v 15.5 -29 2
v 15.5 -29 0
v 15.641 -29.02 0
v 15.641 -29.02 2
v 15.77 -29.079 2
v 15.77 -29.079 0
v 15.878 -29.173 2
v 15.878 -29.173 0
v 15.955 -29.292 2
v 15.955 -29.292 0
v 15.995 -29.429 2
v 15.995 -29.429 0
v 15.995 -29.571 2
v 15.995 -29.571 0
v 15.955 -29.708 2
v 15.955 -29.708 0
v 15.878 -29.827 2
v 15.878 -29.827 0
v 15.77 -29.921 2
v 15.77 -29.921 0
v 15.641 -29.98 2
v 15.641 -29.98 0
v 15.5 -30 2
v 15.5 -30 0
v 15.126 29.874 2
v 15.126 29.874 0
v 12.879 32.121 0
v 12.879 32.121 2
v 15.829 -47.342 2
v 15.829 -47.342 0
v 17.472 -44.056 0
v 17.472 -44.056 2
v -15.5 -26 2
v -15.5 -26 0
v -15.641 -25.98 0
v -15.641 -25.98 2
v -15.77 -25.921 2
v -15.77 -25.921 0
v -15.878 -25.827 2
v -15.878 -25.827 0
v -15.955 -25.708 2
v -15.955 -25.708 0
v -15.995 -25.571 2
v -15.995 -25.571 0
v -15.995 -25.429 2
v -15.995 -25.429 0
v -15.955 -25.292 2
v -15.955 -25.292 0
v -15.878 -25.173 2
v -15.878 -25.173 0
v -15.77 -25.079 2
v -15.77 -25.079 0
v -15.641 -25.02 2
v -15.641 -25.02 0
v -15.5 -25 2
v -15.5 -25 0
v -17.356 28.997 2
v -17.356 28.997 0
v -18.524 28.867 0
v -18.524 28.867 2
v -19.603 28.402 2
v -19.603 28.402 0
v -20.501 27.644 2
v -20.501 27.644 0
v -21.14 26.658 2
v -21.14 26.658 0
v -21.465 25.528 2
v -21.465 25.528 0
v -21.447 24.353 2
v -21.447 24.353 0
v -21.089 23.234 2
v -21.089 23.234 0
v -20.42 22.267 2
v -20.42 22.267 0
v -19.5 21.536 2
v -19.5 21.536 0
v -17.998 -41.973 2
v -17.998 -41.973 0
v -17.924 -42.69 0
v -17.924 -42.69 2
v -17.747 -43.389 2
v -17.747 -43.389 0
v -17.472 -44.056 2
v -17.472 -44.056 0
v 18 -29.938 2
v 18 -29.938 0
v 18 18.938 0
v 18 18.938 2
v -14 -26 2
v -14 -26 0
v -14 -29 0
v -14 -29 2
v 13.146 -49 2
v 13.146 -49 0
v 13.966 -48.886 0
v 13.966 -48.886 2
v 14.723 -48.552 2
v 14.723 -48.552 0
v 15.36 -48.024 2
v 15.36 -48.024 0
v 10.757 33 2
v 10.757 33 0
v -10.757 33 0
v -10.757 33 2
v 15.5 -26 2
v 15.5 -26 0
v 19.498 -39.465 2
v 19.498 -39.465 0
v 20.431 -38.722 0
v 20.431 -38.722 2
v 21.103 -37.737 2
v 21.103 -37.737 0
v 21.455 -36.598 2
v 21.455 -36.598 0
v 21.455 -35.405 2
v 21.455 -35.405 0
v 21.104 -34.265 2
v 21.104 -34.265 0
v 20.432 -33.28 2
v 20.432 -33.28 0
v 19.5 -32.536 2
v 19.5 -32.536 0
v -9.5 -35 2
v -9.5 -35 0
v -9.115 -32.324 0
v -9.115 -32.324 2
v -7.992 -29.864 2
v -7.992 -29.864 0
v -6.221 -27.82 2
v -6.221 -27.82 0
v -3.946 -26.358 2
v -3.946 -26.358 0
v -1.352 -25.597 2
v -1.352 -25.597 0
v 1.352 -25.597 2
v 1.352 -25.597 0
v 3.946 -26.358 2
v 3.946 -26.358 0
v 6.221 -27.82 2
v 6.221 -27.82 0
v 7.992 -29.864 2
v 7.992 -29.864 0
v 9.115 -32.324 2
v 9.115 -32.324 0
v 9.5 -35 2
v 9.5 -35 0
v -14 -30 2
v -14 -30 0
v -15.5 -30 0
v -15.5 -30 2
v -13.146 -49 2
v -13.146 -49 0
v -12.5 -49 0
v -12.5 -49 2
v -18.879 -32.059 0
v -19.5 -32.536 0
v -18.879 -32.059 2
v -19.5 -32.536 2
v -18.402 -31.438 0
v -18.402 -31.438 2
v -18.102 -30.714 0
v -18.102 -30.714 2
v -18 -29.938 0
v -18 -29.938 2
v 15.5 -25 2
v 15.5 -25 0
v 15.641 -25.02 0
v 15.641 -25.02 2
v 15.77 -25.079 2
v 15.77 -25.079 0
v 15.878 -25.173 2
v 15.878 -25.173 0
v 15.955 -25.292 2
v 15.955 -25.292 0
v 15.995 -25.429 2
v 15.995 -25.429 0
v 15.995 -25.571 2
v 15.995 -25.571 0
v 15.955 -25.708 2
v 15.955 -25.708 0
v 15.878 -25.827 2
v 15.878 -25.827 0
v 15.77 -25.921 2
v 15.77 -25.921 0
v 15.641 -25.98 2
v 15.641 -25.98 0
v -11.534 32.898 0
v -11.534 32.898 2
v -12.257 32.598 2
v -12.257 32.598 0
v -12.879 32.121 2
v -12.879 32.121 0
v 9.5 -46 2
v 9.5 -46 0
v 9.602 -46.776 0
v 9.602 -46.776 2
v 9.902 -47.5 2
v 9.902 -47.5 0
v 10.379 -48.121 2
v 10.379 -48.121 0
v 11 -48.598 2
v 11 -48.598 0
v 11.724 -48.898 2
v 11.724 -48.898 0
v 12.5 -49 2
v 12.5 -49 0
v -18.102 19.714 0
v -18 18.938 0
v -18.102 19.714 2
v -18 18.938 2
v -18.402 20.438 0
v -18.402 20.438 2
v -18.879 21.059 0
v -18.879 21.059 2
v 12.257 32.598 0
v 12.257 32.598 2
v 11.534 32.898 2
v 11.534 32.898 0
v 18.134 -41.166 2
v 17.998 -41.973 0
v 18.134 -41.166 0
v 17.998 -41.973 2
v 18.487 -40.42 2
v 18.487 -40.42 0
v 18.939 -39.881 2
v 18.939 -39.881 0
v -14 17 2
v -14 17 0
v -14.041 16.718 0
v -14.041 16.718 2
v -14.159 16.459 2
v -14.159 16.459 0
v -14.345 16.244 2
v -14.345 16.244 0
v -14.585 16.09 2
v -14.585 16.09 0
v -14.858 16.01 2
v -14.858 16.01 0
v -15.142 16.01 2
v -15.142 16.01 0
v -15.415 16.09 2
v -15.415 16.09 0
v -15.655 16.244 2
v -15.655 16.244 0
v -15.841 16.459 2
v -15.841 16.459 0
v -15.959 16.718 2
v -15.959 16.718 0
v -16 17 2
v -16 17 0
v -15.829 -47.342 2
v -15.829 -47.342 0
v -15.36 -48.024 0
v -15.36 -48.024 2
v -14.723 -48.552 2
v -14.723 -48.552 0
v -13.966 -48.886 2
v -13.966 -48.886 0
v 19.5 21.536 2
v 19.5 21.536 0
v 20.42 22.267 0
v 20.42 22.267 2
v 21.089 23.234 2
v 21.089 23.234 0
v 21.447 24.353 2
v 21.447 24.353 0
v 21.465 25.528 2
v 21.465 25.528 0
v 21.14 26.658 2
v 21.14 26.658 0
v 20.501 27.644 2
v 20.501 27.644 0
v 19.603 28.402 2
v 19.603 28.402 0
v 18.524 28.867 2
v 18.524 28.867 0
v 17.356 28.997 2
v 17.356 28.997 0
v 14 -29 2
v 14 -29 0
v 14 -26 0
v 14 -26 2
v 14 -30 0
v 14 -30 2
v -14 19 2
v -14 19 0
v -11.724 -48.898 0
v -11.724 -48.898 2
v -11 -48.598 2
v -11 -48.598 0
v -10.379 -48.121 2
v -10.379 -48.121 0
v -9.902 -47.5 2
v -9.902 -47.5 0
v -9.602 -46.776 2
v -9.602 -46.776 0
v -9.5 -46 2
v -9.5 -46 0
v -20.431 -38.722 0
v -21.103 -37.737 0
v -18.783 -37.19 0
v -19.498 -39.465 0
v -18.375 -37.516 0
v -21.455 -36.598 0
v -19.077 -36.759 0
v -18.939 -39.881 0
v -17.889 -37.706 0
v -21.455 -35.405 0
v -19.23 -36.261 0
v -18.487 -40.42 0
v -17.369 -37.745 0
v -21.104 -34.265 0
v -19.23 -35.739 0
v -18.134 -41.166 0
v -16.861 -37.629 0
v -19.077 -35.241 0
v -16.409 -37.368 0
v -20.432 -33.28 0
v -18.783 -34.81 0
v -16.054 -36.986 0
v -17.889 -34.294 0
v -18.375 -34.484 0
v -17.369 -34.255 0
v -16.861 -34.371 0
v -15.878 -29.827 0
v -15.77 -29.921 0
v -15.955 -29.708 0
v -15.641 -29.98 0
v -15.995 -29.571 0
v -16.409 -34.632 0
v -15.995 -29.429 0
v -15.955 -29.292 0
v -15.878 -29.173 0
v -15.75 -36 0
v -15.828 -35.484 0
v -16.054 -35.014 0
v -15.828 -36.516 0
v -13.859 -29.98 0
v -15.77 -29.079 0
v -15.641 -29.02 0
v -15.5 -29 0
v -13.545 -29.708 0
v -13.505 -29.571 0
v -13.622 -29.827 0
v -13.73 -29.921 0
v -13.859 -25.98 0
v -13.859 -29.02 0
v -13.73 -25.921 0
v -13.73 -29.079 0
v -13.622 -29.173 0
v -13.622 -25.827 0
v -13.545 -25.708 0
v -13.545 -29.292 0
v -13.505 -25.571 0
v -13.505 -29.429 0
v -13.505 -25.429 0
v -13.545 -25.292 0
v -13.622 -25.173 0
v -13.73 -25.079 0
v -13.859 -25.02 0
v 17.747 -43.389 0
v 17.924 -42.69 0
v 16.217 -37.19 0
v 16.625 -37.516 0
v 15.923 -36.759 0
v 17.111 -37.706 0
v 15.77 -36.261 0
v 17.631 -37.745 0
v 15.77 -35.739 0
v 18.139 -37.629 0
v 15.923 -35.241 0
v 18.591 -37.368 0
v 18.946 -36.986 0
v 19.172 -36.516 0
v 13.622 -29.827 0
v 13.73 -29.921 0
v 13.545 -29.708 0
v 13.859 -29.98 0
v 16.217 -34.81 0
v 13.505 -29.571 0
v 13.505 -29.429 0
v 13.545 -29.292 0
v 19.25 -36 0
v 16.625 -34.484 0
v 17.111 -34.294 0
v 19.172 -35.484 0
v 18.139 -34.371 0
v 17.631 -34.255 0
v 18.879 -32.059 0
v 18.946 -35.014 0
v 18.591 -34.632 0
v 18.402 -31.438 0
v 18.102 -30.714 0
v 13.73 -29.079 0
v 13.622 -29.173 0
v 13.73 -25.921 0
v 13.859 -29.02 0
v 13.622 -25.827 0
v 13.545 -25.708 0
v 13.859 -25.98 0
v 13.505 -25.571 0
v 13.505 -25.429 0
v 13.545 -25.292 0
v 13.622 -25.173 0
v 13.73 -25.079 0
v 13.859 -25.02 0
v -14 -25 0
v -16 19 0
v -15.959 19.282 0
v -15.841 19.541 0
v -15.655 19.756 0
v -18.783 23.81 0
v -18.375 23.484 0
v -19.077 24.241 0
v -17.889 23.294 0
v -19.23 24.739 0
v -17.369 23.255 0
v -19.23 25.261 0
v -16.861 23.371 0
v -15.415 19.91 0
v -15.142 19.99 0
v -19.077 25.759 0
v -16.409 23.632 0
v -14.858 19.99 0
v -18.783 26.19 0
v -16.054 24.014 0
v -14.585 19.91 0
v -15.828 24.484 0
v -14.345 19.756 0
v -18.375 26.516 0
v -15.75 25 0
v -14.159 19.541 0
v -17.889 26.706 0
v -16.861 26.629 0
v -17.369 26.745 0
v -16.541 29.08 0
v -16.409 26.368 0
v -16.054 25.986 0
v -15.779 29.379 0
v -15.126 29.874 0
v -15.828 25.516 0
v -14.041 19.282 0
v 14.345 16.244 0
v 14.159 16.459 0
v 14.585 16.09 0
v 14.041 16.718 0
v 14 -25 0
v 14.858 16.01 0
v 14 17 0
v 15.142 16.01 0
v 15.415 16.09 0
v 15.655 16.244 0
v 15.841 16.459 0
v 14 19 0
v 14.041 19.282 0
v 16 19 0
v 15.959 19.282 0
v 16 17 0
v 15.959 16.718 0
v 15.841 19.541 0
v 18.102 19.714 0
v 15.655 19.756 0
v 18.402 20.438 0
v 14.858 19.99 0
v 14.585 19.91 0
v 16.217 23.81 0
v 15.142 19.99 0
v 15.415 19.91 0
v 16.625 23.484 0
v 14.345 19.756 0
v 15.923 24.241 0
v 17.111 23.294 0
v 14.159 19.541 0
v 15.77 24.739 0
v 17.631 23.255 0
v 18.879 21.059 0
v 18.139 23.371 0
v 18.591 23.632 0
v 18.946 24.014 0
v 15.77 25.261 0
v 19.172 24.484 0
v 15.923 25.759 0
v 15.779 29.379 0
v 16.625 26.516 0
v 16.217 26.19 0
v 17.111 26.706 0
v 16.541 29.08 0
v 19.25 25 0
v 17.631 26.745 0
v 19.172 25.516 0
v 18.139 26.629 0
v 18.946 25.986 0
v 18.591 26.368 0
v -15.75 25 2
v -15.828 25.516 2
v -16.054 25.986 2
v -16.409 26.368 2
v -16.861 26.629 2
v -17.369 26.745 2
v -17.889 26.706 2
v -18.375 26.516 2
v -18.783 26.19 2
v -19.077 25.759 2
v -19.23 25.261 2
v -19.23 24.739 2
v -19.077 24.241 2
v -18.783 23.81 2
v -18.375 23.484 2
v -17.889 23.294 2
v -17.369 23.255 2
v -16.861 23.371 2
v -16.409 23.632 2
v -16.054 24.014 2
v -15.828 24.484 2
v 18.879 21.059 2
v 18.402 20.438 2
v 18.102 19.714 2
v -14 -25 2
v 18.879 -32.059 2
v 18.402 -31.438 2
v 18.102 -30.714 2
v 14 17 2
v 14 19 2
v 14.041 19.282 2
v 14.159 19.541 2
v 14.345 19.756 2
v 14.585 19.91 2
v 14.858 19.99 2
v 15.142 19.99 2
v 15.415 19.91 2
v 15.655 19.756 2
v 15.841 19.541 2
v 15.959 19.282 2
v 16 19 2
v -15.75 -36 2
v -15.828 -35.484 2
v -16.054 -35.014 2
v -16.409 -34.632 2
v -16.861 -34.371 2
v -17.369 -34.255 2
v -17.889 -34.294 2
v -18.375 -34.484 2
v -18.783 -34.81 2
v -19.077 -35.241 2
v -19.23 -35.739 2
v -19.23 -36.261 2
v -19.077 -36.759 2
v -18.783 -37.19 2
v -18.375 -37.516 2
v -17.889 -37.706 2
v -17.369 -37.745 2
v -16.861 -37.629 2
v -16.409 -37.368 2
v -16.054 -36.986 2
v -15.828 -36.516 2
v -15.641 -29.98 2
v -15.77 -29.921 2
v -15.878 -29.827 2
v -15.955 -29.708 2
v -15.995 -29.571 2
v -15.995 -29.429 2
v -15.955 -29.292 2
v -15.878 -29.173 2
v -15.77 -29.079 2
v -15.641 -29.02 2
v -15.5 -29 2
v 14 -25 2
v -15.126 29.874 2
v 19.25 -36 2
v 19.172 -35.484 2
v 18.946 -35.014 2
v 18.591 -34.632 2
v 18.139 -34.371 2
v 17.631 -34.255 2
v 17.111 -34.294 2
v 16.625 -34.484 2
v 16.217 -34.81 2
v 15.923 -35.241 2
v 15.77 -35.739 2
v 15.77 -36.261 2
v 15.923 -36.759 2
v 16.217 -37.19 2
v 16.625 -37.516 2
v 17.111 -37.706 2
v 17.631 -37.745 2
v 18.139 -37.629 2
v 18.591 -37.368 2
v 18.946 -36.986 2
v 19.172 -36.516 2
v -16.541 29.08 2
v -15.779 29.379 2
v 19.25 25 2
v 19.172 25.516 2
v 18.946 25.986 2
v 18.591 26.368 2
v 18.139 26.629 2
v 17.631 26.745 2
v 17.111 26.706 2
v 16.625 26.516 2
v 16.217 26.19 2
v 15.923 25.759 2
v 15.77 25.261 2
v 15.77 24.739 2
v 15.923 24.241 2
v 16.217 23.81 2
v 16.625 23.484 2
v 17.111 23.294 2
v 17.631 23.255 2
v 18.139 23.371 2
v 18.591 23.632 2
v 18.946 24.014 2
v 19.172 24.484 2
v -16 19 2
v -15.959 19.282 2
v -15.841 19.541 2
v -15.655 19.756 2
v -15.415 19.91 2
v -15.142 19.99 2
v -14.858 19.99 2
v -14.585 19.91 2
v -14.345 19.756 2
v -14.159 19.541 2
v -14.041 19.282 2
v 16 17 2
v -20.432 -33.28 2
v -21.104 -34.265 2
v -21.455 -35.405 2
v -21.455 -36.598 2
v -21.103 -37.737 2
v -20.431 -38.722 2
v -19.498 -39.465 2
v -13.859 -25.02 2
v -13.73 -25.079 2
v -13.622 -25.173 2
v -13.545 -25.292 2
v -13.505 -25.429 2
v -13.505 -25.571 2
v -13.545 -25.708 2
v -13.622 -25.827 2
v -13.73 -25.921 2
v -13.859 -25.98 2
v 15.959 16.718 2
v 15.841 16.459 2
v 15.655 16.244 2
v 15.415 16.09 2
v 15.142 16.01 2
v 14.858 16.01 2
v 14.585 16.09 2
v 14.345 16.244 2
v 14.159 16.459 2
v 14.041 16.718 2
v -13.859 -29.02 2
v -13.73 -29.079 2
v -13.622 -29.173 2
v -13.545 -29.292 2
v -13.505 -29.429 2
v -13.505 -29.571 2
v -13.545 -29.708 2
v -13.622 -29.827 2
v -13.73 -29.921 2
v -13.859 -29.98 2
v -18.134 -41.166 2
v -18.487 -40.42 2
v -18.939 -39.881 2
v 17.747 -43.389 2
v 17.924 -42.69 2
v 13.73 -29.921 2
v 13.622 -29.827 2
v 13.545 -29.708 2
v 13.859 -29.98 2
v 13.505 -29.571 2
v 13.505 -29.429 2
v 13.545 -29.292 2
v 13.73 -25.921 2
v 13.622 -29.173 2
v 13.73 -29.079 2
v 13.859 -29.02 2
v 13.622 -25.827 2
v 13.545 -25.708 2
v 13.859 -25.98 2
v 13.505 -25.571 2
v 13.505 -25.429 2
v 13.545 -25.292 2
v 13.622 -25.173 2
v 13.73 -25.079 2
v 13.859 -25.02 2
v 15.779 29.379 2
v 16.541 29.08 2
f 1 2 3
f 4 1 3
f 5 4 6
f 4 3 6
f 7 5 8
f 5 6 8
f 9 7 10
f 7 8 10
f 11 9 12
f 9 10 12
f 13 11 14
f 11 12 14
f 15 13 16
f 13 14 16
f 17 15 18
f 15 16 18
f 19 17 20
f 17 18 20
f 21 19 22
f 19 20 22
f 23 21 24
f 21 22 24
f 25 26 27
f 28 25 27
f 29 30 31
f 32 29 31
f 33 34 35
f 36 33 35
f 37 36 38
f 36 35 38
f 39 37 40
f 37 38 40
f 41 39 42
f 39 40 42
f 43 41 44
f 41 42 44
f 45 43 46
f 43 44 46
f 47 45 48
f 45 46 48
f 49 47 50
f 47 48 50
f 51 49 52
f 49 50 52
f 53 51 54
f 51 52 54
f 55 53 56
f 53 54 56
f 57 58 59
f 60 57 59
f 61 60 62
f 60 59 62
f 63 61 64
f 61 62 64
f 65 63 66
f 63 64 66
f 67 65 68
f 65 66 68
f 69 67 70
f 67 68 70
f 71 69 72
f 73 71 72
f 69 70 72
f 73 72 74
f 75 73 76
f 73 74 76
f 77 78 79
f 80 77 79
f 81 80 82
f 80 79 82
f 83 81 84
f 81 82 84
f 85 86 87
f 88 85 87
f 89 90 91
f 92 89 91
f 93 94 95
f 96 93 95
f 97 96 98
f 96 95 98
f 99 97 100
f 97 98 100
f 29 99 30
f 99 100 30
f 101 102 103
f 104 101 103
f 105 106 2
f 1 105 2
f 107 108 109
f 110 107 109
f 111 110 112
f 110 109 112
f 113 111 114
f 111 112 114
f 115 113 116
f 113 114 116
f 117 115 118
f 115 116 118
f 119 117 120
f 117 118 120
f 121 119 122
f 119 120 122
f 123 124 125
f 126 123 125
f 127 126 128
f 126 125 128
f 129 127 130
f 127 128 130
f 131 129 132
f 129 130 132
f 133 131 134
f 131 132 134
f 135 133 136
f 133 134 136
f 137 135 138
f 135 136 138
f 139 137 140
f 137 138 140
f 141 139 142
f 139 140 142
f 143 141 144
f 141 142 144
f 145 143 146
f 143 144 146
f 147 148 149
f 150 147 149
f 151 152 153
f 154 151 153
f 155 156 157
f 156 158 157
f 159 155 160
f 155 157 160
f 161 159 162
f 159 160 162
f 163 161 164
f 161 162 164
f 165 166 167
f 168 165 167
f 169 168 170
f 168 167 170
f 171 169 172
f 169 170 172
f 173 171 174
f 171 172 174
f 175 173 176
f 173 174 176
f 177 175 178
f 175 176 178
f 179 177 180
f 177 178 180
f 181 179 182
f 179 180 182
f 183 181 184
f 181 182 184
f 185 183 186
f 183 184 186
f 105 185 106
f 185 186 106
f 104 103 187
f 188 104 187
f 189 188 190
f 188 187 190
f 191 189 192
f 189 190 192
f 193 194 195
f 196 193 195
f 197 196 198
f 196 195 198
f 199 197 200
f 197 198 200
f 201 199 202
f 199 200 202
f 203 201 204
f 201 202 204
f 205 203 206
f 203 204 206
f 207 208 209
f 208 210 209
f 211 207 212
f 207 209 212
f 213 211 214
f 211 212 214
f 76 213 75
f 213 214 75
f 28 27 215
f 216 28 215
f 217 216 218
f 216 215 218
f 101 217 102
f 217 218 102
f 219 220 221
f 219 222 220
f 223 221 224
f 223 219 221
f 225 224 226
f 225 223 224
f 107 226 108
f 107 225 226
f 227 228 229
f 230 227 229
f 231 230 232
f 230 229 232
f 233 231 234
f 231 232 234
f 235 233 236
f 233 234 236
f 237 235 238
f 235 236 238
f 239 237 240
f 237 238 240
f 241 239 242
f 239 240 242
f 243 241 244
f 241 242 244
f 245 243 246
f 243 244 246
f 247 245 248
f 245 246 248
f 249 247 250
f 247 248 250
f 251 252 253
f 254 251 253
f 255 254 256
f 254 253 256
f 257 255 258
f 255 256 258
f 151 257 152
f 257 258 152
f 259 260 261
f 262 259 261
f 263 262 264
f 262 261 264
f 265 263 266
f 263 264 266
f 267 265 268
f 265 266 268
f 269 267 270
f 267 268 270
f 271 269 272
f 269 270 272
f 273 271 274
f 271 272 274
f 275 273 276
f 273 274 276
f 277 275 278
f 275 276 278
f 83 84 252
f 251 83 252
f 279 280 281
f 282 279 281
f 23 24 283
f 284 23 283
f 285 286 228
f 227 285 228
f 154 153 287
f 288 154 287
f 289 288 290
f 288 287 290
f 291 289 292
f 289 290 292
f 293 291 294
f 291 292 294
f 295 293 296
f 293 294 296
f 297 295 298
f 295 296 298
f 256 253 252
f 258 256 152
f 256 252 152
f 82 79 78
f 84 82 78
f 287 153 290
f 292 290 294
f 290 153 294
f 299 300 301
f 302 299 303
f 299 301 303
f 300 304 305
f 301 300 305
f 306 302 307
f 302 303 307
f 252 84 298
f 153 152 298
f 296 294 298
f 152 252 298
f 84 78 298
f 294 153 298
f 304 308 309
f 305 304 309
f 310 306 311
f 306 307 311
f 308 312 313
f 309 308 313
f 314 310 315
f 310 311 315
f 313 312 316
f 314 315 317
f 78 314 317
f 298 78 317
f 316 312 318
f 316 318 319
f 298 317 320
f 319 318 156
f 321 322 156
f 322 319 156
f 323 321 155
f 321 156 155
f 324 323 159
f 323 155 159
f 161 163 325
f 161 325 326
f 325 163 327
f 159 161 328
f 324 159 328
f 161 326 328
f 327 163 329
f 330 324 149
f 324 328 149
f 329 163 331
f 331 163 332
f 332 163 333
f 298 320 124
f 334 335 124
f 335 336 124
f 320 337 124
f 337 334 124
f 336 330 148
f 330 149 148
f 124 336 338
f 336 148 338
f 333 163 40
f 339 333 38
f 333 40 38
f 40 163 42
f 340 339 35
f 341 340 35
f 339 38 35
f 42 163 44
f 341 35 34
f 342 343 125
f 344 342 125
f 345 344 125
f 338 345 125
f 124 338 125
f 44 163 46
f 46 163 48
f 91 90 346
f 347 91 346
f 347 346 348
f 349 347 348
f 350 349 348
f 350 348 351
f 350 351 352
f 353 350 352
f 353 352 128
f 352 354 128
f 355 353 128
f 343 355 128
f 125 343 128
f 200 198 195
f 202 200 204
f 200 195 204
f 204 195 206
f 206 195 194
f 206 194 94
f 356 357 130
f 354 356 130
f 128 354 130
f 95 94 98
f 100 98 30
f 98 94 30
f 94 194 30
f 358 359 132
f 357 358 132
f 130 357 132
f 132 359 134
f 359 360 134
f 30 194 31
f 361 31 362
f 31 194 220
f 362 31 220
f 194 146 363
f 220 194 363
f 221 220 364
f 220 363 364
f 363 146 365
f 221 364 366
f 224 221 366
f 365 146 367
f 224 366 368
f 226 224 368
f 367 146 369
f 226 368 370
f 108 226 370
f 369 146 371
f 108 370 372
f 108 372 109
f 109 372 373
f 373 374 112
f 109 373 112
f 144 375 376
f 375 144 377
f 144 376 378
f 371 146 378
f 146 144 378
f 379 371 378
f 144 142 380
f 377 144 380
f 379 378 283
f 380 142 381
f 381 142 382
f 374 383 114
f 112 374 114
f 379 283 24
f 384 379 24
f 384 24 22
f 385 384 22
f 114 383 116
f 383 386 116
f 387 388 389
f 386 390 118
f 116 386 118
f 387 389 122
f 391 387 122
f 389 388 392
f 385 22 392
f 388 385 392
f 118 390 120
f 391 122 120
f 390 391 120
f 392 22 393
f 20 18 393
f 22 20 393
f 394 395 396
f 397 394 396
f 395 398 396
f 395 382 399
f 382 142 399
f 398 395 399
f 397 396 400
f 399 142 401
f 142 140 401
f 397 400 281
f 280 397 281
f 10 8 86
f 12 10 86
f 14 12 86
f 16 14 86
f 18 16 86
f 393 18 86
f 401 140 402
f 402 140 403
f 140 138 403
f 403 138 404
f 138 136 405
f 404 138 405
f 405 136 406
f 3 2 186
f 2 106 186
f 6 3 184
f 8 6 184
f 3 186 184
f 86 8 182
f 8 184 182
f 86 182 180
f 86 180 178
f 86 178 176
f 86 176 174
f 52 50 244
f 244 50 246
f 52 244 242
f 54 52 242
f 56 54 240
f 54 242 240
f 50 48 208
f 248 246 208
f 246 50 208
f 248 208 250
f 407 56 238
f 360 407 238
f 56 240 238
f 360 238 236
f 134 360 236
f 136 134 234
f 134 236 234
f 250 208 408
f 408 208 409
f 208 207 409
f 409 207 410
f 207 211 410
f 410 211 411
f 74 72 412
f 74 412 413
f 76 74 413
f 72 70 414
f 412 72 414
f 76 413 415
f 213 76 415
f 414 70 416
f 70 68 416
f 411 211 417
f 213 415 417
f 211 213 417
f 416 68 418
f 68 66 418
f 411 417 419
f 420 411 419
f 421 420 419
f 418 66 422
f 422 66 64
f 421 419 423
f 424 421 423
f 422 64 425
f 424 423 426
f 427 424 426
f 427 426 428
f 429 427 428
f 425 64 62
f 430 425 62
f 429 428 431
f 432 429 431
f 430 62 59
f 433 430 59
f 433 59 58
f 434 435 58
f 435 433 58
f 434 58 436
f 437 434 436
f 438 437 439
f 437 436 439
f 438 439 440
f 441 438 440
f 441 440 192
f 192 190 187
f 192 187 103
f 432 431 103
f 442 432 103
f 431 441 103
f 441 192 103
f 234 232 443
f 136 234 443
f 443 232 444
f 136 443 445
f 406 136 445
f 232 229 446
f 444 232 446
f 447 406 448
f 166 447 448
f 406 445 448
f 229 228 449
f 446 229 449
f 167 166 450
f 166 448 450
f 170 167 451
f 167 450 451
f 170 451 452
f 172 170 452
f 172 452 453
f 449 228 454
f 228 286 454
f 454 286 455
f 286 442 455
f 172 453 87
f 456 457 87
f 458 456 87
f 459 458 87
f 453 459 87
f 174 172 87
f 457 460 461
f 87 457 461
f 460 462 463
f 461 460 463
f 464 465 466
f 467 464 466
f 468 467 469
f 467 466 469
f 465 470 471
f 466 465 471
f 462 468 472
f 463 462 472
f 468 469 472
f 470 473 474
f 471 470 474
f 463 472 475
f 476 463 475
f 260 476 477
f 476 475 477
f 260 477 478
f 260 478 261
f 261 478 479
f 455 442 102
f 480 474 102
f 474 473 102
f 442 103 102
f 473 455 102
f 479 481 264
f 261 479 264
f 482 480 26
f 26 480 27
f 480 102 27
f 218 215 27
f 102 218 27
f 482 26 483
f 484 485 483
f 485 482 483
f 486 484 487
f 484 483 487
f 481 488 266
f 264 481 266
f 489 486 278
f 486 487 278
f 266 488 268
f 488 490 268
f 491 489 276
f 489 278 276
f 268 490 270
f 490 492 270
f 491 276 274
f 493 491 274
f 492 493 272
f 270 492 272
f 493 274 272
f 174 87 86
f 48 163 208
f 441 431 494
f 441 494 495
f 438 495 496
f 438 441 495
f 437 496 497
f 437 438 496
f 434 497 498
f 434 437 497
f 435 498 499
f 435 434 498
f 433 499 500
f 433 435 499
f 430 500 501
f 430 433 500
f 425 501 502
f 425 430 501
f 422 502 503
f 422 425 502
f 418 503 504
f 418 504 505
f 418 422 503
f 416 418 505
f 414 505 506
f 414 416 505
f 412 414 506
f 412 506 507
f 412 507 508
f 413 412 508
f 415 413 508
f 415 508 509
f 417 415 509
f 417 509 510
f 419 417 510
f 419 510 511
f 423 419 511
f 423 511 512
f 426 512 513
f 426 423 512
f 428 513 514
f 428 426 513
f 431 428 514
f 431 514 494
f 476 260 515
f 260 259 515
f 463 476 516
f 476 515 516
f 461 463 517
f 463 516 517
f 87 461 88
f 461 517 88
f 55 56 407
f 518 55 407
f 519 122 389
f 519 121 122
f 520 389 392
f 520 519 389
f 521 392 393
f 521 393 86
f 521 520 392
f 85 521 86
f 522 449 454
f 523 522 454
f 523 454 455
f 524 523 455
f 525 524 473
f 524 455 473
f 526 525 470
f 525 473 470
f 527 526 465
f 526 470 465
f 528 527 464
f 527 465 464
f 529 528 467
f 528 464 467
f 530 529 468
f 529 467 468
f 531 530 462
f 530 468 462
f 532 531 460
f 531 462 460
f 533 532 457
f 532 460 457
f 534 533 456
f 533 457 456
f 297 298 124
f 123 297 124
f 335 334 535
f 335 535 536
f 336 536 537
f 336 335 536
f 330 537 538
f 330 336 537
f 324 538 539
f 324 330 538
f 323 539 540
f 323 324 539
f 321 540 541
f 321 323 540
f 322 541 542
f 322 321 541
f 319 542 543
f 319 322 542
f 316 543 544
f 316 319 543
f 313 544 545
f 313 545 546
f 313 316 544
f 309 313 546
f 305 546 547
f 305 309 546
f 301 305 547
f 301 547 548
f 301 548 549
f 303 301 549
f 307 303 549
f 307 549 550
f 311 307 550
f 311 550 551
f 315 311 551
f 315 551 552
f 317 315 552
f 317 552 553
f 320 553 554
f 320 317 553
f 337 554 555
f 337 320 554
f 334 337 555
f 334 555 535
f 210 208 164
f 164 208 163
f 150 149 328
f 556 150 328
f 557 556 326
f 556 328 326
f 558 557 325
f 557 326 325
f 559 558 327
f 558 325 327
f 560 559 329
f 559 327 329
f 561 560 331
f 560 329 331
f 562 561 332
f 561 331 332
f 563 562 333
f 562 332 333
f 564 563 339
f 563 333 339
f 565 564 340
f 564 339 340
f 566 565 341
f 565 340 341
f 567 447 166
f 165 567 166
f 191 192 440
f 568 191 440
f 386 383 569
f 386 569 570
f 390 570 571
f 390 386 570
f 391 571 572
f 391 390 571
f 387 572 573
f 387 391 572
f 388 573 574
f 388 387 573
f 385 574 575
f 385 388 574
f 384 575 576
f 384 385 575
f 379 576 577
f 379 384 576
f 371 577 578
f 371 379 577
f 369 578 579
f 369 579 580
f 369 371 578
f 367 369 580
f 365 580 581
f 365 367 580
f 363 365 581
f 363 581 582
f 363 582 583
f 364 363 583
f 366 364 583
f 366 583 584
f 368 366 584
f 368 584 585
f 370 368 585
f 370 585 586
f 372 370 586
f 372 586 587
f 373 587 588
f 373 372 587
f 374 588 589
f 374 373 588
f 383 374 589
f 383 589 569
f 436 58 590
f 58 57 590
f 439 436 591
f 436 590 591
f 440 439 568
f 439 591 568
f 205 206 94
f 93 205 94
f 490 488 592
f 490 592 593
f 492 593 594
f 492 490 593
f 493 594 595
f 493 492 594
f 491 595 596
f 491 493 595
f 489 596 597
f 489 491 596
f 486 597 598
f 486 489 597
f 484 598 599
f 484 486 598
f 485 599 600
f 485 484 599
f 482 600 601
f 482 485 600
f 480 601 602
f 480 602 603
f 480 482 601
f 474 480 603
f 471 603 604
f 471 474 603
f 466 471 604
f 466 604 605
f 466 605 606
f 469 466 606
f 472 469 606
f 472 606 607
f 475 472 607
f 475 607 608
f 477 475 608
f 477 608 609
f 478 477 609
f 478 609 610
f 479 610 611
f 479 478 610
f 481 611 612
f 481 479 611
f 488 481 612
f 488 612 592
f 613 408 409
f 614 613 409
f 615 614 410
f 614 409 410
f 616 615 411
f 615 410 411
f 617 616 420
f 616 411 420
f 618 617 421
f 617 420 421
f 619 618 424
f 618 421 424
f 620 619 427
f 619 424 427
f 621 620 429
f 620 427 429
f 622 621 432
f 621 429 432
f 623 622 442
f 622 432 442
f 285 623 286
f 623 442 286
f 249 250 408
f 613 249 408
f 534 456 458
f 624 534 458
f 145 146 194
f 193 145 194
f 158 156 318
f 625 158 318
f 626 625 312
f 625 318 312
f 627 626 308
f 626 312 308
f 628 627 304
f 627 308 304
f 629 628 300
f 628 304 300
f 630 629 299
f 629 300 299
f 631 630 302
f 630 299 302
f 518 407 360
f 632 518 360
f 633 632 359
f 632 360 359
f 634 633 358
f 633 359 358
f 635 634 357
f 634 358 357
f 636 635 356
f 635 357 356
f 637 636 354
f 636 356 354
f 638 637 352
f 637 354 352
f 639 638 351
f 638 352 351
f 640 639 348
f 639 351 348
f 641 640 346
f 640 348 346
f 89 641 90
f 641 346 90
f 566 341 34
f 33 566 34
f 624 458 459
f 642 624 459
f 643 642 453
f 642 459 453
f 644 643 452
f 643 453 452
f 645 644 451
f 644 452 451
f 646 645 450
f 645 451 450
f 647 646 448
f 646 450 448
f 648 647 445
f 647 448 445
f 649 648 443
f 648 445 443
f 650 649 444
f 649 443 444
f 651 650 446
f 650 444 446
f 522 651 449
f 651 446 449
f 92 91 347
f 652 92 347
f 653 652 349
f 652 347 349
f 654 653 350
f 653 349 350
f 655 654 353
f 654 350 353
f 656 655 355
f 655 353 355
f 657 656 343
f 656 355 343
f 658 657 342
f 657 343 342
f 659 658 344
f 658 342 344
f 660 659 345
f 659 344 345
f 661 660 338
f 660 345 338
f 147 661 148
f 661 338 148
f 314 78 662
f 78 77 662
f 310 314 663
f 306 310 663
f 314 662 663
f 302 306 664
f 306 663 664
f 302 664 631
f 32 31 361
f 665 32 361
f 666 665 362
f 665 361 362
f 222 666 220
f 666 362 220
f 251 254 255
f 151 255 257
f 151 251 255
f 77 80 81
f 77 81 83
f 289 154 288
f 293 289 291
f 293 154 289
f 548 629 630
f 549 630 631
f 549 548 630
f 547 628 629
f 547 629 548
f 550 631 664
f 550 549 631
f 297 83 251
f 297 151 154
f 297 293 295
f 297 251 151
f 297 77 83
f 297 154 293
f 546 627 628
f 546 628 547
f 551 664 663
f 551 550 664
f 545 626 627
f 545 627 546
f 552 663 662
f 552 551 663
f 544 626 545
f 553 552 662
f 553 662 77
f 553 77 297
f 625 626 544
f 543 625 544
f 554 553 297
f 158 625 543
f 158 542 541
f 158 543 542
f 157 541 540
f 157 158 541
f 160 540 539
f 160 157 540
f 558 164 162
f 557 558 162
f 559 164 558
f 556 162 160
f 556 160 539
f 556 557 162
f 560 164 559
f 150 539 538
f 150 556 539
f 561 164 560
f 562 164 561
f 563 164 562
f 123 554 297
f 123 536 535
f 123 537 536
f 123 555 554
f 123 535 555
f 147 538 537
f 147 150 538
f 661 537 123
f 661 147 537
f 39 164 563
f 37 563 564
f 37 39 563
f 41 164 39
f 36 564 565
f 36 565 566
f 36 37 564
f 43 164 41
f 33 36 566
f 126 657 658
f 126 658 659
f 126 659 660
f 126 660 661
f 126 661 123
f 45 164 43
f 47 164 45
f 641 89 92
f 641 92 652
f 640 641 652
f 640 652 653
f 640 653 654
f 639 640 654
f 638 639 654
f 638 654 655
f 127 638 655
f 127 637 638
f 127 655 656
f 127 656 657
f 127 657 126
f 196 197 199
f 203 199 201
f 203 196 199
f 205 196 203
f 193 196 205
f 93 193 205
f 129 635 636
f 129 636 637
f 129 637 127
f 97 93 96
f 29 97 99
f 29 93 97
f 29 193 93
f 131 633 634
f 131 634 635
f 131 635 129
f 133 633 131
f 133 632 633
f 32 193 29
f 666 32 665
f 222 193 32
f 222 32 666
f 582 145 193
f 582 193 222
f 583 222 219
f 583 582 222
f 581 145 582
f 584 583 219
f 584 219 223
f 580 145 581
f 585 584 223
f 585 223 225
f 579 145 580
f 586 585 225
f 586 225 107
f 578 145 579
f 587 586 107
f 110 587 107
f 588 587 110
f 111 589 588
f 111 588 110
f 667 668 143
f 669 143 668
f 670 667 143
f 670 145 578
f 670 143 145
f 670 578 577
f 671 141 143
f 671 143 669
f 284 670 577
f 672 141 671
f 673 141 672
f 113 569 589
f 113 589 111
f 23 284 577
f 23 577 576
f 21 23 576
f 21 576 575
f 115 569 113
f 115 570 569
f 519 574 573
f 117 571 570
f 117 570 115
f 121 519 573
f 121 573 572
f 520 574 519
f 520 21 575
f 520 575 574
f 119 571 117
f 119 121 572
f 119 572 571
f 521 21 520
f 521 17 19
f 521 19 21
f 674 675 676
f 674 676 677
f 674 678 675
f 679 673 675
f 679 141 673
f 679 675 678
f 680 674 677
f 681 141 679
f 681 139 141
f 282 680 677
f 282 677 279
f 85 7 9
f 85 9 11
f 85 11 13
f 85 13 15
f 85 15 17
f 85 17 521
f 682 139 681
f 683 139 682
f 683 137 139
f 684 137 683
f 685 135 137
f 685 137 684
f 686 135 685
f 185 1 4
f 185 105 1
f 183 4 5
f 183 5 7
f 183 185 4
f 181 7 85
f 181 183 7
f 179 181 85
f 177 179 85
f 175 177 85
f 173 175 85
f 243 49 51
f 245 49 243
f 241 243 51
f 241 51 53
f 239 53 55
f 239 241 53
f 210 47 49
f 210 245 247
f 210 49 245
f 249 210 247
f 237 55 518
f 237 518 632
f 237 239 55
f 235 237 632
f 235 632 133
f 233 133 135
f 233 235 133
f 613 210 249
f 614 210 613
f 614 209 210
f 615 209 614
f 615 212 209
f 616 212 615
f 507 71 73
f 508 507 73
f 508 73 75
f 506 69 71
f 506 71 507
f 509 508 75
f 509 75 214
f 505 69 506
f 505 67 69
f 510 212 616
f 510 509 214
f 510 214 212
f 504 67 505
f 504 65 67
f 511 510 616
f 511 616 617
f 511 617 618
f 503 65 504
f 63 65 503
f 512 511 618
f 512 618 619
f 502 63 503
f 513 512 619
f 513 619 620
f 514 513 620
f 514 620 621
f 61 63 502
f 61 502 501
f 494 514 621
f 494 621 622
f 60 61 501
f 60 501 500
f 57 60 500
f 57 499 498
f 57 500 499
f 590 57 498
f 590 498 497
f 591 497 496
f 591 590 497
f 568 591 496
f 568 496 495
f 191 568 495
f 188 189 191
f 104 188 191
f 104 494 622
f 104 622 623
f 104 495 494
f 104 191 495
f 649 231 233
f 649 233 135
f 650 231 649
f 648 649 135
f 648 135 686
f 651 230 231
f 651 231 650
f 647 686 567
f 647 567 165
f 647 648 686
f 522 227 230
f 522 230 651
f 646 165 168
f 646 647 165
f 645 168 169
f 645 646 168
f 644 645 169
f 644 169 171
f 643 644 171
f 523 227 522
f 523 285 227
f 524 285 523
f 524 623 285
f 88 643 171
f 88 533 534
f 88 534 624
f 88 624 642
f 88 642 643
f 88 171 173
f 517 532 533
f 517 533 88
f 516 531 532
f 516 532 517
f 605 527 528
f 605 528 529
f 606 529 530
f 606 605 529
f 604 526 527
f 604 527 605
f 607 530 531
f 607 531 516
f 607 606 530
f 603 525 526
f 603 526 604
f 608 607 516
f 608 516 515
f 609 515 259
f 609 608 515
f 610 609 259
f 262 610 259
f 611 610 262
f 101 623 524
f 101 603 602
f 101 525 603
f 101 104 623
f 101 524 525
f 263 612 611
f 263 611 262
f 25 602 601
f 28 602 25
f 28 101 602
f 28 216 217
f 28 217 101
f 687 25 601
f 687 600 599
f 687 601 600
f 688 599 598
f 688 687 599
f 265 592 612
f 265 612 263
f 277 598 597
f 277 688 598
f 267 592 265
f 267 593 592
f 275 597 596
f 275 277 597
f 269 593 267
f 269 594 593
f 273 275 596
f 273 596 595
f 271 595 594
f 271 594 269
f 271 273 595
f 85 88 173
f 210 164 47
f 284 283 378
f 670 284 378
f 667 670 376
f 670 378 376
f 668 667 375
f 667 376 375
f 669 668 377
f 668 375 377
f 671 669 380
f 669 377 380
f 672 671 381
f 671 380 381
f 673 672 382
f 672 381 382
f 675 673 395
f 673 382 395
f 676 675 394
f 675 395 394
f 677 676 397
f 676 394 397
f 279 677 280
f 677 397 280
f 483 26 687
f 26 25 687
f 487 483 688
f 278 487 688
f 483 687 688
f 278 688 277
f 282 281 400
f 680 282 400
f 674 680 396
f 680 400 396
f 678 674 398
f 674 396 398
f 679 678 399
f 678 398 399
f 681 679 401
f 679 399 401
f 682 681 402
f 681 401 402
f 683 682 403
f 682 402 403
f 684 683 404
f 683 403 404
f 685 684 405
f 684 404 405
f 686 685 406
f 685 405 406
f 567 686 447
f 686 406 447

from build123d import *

# Parameters (mm, degrees)
F0_R     = 1.75
F1_DEPTH = 2
F2_R     = 3


with BuildPart() as f1:
    # F0 (on Top) → F1 (new body)
    with BuildSketch(Plane.XY):
        with BuildLine():
            ThreePointArc((-15.82918, -47.341641), (-14.723091, -48.551952), (-13.145898, -49))
            Line((-13.145898, -49), (-12.5, -49))
            ThreePointArc((-12.5, -49), (-10.37868, -48.12132), (-9.5, -46))
            Line((-9.5, -46), (-9.5, -35))
            ThreePointArc((-9.5, -35), (0, -25.5), (9.5, -35))
            Line((9.5, -35), (9.5, -46))
            ThreePointArc((9.5, -46), (10.37868, -48.12132), (12.5, -49))
            Line((12.5, -49), (13.145898, -49))
            ThreePointArc((13.145898, -49), (14.723091, -48.551952), (15.82918, -47.341641))
            Line((15.82918, -47.341641), (17.472136, -44.055728))
            ThreePointArc((17.472136, -44.055728), (17.866245, -42.968425), (18, -41.81966))
            Line((18, -41.81966), (18, -39.968627))
            ThreePointArc((18, -39.968627), (21.5, -36), (18, -32.031373))
            Line((18, -32.031373), (18, 21.031373))
            ThreePointArc((18, 21.031373), (21.39785, 25.898203), (16.212777, 28.787223))
            Line((16.212777, 28.787223), (12.87868, 32.12132))
            ThreePointArc((12.87868, 32.12132), (11.90541, 32.771639), (10.757359, 33))
            Line((10.757359, 33), (-10.757359, 33))
            ThreePointArc((-10.757359, 33), (-11.90541, 32.771639), (-12.87868, 32.12132))
            Line((-12.87868, 32.12132), (-16.212777, 28.787223))
            ThreePointArc((-16.212777, 28.787223), (-21.39785, 25.898203), (-18, 21.031373))
            Line((-18, 21.031373), (-18, -32.031373))
            ThreePointArc((-18, -32.031373), (-21.5, -36), (-18, -39.968627))
            Line((-18, -39.968627), (-18, -41.81966))
            ThreePointArc((-18, -41.81966), (-17.866245, -42.968425), (-17.472136, -44.055728))
            Line((-17.472136, -44.055728), (-15.82918, -47.341641))
        make_face()
        with Locations((-17.5, -36)):
            Circle(F0_R, mode=Mode.SUBTRACT)
        with BuildLine():
            ThreePointArc((-15.5, -26), (-16, -25.5), (-15.5, -25))
            Line((-15.5, -25), (-14, -25))
            ThreePointArc((-14, -25), (-13.5, -25.5), (-14, -26))
            Line((-14, -26), (-14, -29))
            ThreePointArc((-14, -29), (-13.5, -29.5), (-14, -30))
            Line((-14, -30), (-15.5, -30))
            ThreePointArc((-15.5, -30), (-16, -29.5), (-15.5, -29))
            Line((-15.5, -29), (-15.5, -26))
        make_face(mode=Mode.SUBTRACT)
        with Locations((17.5, -36)):
            Circle(F0_R, mode=Mode.SUBTRACT)
        with BuildLine():
            Line((15.5, -30), (14, -30))
            ThreePointArc((14, -30), (13.5, -29.5), (14, -29))
            Line((14, -29), (14, -26))
            ThreePointArc((14, -26), (13.5, -25.5), (14, -25))
            Line((14, -25), (15.5, -25))
            ThreePointArc((15.5, -25), (16, -25.5), (15.5, -26))
            Line((15.5, -26), (15.5, -29))
            ThreePointArc((15.5, -29), (16, -29.5), (15.5, -30))
        make_face(mode=Mode.SUBTRACT)
        with BuildLine():
            Line((-16, 17), (-16, 19))
            ThreePointArc((-16, 19), (-15, 20), (-14, 19))
            Line((-14, 19), (-14, 17))
            ThreePointArc((-14, 17), (-15, 16), (-16, 17))
        make_face(mode=Mode.SUBTRACT)
        with Locations((-17.5, 25)):
            Circle(F0_R, mode=Mode.SUBTRACT)
        with BuildLine():
            ThreePointArc((14, 19), (15, 20), (16, 19))
            Line((16, 19), (16, 17))
            ThreePointArc((16, 17), (15, 16), (14, 17))
            Line((14, 17), (14, 19))
        make_face(mode=Mode.SUBTRACT)
        with Locations((17.5, 25)):
            Circle(F0_R, mode=Mode.SUBTRACT)
    extrude(amount=F1_DEPTH)

    # F2
    f2_edges = [f1.edges().sort_by_distance(p)[0] for p in [
        (-18, -39.968627, 1),
        (-18, -32.031373, 1),
        (18, -39.968627, 1),
        (18, -32.031373, 1),
        (16.212777, 28.787223, 1),
        (18, 21.031373, 1),
        (-16.212777, 28.787223, 1),
        (-18, 21.031373, 1),
    ]]
    fillet(f2_edges, radius=F2_R)


solid = f1.part
